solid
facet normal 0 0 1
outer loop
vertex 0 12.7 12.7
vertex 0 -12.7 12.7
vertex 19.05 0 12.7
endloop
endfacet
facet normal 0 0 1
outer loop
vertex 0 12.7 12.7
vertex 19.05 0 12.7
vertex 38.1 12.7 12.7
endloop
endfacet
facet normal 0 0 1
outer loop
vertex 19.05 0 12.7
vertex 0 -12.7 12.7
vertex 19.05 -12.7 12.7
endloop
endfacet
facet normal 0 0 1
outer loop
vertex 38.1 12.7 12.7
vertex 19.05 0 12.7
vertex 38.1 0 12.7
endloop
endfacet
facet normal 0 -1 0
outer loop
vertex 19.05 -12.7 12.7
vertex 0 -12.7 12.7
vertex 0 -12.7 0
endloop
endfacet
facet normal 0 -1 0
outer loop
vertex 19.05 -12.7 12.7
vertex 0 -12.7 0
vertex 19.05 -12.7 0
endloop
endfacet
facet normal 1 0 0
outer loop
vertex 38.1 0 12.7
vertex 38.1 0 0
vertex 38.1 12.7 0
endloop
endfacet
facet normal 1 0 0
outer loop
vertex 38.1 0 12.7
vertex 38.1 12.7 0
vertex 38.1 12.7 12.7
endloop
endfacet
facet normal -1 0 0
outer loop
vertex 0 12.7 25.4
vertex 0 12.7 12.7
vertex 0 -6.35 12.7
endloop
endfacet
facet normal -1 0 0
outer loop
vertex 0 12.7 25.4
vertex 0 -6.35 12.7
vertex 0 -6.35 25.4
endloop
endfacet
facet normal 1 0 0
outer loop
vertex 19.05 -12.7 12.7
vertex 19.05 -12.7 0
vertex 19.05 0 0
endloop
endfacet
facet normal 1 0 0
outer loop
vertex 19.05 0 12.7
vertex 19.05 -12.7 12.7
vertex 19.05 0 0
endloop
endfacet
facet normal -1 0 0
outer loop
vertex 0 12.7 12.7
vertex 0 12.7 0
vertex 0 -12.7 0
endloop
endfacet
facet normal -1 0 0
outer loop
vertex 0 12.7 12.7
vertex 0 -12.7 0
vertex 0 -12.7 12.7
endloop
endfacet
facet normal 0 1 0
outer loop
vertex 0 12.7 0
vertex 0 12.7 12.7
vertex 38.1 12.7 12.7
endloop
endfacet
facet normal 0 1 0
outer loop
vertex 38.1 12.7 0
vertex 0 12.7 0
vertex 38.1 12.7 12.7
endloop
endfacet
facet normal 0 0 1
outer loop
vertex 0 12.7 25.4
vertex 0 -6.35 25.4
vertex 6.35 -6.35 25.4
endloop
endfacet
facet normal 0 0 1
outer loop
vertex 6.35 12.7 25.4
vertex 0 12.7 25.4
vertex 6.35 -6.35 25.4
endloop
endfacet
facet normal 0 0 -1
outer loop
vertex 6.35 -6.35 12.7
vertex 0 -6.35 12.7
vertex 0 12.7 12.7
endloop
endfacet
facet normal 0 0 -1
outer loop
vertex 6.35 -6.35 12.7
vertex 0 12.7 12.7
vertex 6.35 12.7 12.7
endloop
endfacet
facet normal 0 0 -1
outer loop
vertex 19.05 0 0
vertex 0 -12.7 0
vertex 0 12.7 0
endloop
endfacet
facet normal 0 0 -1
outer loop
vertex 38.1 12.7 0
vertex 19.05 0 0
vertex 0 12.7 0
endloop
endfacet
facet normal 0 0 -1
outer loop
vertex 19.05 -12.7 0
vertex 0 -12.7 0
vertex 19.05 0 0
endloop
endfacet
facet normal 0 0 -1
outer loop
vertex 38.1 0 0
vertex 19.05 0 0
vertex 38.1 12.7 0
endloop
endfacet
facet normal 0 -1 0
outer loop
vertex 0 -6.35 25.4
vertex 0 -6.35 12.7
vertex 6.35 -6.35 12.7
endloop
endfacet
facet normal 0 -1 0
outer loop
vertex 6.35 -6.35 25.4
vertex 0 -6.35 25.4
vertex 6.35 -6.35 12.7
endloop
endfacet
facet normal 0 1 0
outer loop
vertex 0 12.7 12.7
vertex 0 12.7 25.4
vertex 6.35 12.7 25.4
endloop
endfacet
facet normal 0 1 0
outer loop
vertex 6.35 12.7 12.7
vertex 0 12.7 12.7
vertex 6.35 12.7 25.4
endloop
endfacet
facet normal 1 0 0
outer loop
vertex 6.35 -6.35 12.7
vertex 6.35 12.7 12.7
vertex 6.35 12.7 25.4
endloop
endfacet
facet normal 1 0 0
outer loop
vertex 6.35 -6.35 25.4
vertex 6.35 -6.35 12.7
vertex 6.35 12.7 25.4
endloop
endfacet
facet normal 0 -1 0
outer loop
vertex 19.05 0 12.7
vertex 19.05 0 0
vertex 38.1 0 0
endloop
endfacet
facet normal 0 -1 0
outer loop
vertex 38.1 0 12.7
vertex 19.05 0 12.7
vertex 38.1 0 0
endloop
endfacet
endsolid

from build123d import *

# Parameters (mm, degrees)
F0_W     = 38.1
F0_H     = 12.7
F1_DEPTH = 12.7
F2_W     = 19.05
F2_H     = 12.7
F3_DEPTH = 12.701
F4_W     = 6.35
F4_H     = 12.7
F5_DEPTH = 12.7
F6_W     = 6.35
F6_H     = 6.35
F7_DEPTH = 25.401


with BuildPart() as f1:
    # F0 (on Front) → F1 (new body, symmetric)
    with BuildSketch(Plane.XZ):
        with Locations((19.05, 6.35)):
            Rectangle(F0_W, F0_H)
    extrude(amount=F1_DEPTH, both=True)

    # F2 (on Top) → F3 (cut, through all)
    with BuildSketch(Plane.XY):
        with Locations((28.575, -6.35)):
            Rectangle(F2_W, F2_H)
    extrude(amount=F3_DEPTH, mode=Mode.SUBTRACT)


with BuildPart() as f5:
    # F4 (on Front) → F5 (new body, symmetric)
    with BuildSketch(Plane.XZ):
        with Locations((3.175, 19.05)):
            Rectangle(F4_W, F4_H)
    extrude(amount=F5_DEPTH, both=True)

    # F6 (on Top) → F7 (cut, through all)
    with BuildSketch(Plane.XY):
        with Locations((3.175, -9.525)):
            Rectangle(F6_W, F6_H)
    extrude(amount=F7_DEPTH, mode=Mode.SUBTRACT)


solid = Compound([f1.part, f5.part])
